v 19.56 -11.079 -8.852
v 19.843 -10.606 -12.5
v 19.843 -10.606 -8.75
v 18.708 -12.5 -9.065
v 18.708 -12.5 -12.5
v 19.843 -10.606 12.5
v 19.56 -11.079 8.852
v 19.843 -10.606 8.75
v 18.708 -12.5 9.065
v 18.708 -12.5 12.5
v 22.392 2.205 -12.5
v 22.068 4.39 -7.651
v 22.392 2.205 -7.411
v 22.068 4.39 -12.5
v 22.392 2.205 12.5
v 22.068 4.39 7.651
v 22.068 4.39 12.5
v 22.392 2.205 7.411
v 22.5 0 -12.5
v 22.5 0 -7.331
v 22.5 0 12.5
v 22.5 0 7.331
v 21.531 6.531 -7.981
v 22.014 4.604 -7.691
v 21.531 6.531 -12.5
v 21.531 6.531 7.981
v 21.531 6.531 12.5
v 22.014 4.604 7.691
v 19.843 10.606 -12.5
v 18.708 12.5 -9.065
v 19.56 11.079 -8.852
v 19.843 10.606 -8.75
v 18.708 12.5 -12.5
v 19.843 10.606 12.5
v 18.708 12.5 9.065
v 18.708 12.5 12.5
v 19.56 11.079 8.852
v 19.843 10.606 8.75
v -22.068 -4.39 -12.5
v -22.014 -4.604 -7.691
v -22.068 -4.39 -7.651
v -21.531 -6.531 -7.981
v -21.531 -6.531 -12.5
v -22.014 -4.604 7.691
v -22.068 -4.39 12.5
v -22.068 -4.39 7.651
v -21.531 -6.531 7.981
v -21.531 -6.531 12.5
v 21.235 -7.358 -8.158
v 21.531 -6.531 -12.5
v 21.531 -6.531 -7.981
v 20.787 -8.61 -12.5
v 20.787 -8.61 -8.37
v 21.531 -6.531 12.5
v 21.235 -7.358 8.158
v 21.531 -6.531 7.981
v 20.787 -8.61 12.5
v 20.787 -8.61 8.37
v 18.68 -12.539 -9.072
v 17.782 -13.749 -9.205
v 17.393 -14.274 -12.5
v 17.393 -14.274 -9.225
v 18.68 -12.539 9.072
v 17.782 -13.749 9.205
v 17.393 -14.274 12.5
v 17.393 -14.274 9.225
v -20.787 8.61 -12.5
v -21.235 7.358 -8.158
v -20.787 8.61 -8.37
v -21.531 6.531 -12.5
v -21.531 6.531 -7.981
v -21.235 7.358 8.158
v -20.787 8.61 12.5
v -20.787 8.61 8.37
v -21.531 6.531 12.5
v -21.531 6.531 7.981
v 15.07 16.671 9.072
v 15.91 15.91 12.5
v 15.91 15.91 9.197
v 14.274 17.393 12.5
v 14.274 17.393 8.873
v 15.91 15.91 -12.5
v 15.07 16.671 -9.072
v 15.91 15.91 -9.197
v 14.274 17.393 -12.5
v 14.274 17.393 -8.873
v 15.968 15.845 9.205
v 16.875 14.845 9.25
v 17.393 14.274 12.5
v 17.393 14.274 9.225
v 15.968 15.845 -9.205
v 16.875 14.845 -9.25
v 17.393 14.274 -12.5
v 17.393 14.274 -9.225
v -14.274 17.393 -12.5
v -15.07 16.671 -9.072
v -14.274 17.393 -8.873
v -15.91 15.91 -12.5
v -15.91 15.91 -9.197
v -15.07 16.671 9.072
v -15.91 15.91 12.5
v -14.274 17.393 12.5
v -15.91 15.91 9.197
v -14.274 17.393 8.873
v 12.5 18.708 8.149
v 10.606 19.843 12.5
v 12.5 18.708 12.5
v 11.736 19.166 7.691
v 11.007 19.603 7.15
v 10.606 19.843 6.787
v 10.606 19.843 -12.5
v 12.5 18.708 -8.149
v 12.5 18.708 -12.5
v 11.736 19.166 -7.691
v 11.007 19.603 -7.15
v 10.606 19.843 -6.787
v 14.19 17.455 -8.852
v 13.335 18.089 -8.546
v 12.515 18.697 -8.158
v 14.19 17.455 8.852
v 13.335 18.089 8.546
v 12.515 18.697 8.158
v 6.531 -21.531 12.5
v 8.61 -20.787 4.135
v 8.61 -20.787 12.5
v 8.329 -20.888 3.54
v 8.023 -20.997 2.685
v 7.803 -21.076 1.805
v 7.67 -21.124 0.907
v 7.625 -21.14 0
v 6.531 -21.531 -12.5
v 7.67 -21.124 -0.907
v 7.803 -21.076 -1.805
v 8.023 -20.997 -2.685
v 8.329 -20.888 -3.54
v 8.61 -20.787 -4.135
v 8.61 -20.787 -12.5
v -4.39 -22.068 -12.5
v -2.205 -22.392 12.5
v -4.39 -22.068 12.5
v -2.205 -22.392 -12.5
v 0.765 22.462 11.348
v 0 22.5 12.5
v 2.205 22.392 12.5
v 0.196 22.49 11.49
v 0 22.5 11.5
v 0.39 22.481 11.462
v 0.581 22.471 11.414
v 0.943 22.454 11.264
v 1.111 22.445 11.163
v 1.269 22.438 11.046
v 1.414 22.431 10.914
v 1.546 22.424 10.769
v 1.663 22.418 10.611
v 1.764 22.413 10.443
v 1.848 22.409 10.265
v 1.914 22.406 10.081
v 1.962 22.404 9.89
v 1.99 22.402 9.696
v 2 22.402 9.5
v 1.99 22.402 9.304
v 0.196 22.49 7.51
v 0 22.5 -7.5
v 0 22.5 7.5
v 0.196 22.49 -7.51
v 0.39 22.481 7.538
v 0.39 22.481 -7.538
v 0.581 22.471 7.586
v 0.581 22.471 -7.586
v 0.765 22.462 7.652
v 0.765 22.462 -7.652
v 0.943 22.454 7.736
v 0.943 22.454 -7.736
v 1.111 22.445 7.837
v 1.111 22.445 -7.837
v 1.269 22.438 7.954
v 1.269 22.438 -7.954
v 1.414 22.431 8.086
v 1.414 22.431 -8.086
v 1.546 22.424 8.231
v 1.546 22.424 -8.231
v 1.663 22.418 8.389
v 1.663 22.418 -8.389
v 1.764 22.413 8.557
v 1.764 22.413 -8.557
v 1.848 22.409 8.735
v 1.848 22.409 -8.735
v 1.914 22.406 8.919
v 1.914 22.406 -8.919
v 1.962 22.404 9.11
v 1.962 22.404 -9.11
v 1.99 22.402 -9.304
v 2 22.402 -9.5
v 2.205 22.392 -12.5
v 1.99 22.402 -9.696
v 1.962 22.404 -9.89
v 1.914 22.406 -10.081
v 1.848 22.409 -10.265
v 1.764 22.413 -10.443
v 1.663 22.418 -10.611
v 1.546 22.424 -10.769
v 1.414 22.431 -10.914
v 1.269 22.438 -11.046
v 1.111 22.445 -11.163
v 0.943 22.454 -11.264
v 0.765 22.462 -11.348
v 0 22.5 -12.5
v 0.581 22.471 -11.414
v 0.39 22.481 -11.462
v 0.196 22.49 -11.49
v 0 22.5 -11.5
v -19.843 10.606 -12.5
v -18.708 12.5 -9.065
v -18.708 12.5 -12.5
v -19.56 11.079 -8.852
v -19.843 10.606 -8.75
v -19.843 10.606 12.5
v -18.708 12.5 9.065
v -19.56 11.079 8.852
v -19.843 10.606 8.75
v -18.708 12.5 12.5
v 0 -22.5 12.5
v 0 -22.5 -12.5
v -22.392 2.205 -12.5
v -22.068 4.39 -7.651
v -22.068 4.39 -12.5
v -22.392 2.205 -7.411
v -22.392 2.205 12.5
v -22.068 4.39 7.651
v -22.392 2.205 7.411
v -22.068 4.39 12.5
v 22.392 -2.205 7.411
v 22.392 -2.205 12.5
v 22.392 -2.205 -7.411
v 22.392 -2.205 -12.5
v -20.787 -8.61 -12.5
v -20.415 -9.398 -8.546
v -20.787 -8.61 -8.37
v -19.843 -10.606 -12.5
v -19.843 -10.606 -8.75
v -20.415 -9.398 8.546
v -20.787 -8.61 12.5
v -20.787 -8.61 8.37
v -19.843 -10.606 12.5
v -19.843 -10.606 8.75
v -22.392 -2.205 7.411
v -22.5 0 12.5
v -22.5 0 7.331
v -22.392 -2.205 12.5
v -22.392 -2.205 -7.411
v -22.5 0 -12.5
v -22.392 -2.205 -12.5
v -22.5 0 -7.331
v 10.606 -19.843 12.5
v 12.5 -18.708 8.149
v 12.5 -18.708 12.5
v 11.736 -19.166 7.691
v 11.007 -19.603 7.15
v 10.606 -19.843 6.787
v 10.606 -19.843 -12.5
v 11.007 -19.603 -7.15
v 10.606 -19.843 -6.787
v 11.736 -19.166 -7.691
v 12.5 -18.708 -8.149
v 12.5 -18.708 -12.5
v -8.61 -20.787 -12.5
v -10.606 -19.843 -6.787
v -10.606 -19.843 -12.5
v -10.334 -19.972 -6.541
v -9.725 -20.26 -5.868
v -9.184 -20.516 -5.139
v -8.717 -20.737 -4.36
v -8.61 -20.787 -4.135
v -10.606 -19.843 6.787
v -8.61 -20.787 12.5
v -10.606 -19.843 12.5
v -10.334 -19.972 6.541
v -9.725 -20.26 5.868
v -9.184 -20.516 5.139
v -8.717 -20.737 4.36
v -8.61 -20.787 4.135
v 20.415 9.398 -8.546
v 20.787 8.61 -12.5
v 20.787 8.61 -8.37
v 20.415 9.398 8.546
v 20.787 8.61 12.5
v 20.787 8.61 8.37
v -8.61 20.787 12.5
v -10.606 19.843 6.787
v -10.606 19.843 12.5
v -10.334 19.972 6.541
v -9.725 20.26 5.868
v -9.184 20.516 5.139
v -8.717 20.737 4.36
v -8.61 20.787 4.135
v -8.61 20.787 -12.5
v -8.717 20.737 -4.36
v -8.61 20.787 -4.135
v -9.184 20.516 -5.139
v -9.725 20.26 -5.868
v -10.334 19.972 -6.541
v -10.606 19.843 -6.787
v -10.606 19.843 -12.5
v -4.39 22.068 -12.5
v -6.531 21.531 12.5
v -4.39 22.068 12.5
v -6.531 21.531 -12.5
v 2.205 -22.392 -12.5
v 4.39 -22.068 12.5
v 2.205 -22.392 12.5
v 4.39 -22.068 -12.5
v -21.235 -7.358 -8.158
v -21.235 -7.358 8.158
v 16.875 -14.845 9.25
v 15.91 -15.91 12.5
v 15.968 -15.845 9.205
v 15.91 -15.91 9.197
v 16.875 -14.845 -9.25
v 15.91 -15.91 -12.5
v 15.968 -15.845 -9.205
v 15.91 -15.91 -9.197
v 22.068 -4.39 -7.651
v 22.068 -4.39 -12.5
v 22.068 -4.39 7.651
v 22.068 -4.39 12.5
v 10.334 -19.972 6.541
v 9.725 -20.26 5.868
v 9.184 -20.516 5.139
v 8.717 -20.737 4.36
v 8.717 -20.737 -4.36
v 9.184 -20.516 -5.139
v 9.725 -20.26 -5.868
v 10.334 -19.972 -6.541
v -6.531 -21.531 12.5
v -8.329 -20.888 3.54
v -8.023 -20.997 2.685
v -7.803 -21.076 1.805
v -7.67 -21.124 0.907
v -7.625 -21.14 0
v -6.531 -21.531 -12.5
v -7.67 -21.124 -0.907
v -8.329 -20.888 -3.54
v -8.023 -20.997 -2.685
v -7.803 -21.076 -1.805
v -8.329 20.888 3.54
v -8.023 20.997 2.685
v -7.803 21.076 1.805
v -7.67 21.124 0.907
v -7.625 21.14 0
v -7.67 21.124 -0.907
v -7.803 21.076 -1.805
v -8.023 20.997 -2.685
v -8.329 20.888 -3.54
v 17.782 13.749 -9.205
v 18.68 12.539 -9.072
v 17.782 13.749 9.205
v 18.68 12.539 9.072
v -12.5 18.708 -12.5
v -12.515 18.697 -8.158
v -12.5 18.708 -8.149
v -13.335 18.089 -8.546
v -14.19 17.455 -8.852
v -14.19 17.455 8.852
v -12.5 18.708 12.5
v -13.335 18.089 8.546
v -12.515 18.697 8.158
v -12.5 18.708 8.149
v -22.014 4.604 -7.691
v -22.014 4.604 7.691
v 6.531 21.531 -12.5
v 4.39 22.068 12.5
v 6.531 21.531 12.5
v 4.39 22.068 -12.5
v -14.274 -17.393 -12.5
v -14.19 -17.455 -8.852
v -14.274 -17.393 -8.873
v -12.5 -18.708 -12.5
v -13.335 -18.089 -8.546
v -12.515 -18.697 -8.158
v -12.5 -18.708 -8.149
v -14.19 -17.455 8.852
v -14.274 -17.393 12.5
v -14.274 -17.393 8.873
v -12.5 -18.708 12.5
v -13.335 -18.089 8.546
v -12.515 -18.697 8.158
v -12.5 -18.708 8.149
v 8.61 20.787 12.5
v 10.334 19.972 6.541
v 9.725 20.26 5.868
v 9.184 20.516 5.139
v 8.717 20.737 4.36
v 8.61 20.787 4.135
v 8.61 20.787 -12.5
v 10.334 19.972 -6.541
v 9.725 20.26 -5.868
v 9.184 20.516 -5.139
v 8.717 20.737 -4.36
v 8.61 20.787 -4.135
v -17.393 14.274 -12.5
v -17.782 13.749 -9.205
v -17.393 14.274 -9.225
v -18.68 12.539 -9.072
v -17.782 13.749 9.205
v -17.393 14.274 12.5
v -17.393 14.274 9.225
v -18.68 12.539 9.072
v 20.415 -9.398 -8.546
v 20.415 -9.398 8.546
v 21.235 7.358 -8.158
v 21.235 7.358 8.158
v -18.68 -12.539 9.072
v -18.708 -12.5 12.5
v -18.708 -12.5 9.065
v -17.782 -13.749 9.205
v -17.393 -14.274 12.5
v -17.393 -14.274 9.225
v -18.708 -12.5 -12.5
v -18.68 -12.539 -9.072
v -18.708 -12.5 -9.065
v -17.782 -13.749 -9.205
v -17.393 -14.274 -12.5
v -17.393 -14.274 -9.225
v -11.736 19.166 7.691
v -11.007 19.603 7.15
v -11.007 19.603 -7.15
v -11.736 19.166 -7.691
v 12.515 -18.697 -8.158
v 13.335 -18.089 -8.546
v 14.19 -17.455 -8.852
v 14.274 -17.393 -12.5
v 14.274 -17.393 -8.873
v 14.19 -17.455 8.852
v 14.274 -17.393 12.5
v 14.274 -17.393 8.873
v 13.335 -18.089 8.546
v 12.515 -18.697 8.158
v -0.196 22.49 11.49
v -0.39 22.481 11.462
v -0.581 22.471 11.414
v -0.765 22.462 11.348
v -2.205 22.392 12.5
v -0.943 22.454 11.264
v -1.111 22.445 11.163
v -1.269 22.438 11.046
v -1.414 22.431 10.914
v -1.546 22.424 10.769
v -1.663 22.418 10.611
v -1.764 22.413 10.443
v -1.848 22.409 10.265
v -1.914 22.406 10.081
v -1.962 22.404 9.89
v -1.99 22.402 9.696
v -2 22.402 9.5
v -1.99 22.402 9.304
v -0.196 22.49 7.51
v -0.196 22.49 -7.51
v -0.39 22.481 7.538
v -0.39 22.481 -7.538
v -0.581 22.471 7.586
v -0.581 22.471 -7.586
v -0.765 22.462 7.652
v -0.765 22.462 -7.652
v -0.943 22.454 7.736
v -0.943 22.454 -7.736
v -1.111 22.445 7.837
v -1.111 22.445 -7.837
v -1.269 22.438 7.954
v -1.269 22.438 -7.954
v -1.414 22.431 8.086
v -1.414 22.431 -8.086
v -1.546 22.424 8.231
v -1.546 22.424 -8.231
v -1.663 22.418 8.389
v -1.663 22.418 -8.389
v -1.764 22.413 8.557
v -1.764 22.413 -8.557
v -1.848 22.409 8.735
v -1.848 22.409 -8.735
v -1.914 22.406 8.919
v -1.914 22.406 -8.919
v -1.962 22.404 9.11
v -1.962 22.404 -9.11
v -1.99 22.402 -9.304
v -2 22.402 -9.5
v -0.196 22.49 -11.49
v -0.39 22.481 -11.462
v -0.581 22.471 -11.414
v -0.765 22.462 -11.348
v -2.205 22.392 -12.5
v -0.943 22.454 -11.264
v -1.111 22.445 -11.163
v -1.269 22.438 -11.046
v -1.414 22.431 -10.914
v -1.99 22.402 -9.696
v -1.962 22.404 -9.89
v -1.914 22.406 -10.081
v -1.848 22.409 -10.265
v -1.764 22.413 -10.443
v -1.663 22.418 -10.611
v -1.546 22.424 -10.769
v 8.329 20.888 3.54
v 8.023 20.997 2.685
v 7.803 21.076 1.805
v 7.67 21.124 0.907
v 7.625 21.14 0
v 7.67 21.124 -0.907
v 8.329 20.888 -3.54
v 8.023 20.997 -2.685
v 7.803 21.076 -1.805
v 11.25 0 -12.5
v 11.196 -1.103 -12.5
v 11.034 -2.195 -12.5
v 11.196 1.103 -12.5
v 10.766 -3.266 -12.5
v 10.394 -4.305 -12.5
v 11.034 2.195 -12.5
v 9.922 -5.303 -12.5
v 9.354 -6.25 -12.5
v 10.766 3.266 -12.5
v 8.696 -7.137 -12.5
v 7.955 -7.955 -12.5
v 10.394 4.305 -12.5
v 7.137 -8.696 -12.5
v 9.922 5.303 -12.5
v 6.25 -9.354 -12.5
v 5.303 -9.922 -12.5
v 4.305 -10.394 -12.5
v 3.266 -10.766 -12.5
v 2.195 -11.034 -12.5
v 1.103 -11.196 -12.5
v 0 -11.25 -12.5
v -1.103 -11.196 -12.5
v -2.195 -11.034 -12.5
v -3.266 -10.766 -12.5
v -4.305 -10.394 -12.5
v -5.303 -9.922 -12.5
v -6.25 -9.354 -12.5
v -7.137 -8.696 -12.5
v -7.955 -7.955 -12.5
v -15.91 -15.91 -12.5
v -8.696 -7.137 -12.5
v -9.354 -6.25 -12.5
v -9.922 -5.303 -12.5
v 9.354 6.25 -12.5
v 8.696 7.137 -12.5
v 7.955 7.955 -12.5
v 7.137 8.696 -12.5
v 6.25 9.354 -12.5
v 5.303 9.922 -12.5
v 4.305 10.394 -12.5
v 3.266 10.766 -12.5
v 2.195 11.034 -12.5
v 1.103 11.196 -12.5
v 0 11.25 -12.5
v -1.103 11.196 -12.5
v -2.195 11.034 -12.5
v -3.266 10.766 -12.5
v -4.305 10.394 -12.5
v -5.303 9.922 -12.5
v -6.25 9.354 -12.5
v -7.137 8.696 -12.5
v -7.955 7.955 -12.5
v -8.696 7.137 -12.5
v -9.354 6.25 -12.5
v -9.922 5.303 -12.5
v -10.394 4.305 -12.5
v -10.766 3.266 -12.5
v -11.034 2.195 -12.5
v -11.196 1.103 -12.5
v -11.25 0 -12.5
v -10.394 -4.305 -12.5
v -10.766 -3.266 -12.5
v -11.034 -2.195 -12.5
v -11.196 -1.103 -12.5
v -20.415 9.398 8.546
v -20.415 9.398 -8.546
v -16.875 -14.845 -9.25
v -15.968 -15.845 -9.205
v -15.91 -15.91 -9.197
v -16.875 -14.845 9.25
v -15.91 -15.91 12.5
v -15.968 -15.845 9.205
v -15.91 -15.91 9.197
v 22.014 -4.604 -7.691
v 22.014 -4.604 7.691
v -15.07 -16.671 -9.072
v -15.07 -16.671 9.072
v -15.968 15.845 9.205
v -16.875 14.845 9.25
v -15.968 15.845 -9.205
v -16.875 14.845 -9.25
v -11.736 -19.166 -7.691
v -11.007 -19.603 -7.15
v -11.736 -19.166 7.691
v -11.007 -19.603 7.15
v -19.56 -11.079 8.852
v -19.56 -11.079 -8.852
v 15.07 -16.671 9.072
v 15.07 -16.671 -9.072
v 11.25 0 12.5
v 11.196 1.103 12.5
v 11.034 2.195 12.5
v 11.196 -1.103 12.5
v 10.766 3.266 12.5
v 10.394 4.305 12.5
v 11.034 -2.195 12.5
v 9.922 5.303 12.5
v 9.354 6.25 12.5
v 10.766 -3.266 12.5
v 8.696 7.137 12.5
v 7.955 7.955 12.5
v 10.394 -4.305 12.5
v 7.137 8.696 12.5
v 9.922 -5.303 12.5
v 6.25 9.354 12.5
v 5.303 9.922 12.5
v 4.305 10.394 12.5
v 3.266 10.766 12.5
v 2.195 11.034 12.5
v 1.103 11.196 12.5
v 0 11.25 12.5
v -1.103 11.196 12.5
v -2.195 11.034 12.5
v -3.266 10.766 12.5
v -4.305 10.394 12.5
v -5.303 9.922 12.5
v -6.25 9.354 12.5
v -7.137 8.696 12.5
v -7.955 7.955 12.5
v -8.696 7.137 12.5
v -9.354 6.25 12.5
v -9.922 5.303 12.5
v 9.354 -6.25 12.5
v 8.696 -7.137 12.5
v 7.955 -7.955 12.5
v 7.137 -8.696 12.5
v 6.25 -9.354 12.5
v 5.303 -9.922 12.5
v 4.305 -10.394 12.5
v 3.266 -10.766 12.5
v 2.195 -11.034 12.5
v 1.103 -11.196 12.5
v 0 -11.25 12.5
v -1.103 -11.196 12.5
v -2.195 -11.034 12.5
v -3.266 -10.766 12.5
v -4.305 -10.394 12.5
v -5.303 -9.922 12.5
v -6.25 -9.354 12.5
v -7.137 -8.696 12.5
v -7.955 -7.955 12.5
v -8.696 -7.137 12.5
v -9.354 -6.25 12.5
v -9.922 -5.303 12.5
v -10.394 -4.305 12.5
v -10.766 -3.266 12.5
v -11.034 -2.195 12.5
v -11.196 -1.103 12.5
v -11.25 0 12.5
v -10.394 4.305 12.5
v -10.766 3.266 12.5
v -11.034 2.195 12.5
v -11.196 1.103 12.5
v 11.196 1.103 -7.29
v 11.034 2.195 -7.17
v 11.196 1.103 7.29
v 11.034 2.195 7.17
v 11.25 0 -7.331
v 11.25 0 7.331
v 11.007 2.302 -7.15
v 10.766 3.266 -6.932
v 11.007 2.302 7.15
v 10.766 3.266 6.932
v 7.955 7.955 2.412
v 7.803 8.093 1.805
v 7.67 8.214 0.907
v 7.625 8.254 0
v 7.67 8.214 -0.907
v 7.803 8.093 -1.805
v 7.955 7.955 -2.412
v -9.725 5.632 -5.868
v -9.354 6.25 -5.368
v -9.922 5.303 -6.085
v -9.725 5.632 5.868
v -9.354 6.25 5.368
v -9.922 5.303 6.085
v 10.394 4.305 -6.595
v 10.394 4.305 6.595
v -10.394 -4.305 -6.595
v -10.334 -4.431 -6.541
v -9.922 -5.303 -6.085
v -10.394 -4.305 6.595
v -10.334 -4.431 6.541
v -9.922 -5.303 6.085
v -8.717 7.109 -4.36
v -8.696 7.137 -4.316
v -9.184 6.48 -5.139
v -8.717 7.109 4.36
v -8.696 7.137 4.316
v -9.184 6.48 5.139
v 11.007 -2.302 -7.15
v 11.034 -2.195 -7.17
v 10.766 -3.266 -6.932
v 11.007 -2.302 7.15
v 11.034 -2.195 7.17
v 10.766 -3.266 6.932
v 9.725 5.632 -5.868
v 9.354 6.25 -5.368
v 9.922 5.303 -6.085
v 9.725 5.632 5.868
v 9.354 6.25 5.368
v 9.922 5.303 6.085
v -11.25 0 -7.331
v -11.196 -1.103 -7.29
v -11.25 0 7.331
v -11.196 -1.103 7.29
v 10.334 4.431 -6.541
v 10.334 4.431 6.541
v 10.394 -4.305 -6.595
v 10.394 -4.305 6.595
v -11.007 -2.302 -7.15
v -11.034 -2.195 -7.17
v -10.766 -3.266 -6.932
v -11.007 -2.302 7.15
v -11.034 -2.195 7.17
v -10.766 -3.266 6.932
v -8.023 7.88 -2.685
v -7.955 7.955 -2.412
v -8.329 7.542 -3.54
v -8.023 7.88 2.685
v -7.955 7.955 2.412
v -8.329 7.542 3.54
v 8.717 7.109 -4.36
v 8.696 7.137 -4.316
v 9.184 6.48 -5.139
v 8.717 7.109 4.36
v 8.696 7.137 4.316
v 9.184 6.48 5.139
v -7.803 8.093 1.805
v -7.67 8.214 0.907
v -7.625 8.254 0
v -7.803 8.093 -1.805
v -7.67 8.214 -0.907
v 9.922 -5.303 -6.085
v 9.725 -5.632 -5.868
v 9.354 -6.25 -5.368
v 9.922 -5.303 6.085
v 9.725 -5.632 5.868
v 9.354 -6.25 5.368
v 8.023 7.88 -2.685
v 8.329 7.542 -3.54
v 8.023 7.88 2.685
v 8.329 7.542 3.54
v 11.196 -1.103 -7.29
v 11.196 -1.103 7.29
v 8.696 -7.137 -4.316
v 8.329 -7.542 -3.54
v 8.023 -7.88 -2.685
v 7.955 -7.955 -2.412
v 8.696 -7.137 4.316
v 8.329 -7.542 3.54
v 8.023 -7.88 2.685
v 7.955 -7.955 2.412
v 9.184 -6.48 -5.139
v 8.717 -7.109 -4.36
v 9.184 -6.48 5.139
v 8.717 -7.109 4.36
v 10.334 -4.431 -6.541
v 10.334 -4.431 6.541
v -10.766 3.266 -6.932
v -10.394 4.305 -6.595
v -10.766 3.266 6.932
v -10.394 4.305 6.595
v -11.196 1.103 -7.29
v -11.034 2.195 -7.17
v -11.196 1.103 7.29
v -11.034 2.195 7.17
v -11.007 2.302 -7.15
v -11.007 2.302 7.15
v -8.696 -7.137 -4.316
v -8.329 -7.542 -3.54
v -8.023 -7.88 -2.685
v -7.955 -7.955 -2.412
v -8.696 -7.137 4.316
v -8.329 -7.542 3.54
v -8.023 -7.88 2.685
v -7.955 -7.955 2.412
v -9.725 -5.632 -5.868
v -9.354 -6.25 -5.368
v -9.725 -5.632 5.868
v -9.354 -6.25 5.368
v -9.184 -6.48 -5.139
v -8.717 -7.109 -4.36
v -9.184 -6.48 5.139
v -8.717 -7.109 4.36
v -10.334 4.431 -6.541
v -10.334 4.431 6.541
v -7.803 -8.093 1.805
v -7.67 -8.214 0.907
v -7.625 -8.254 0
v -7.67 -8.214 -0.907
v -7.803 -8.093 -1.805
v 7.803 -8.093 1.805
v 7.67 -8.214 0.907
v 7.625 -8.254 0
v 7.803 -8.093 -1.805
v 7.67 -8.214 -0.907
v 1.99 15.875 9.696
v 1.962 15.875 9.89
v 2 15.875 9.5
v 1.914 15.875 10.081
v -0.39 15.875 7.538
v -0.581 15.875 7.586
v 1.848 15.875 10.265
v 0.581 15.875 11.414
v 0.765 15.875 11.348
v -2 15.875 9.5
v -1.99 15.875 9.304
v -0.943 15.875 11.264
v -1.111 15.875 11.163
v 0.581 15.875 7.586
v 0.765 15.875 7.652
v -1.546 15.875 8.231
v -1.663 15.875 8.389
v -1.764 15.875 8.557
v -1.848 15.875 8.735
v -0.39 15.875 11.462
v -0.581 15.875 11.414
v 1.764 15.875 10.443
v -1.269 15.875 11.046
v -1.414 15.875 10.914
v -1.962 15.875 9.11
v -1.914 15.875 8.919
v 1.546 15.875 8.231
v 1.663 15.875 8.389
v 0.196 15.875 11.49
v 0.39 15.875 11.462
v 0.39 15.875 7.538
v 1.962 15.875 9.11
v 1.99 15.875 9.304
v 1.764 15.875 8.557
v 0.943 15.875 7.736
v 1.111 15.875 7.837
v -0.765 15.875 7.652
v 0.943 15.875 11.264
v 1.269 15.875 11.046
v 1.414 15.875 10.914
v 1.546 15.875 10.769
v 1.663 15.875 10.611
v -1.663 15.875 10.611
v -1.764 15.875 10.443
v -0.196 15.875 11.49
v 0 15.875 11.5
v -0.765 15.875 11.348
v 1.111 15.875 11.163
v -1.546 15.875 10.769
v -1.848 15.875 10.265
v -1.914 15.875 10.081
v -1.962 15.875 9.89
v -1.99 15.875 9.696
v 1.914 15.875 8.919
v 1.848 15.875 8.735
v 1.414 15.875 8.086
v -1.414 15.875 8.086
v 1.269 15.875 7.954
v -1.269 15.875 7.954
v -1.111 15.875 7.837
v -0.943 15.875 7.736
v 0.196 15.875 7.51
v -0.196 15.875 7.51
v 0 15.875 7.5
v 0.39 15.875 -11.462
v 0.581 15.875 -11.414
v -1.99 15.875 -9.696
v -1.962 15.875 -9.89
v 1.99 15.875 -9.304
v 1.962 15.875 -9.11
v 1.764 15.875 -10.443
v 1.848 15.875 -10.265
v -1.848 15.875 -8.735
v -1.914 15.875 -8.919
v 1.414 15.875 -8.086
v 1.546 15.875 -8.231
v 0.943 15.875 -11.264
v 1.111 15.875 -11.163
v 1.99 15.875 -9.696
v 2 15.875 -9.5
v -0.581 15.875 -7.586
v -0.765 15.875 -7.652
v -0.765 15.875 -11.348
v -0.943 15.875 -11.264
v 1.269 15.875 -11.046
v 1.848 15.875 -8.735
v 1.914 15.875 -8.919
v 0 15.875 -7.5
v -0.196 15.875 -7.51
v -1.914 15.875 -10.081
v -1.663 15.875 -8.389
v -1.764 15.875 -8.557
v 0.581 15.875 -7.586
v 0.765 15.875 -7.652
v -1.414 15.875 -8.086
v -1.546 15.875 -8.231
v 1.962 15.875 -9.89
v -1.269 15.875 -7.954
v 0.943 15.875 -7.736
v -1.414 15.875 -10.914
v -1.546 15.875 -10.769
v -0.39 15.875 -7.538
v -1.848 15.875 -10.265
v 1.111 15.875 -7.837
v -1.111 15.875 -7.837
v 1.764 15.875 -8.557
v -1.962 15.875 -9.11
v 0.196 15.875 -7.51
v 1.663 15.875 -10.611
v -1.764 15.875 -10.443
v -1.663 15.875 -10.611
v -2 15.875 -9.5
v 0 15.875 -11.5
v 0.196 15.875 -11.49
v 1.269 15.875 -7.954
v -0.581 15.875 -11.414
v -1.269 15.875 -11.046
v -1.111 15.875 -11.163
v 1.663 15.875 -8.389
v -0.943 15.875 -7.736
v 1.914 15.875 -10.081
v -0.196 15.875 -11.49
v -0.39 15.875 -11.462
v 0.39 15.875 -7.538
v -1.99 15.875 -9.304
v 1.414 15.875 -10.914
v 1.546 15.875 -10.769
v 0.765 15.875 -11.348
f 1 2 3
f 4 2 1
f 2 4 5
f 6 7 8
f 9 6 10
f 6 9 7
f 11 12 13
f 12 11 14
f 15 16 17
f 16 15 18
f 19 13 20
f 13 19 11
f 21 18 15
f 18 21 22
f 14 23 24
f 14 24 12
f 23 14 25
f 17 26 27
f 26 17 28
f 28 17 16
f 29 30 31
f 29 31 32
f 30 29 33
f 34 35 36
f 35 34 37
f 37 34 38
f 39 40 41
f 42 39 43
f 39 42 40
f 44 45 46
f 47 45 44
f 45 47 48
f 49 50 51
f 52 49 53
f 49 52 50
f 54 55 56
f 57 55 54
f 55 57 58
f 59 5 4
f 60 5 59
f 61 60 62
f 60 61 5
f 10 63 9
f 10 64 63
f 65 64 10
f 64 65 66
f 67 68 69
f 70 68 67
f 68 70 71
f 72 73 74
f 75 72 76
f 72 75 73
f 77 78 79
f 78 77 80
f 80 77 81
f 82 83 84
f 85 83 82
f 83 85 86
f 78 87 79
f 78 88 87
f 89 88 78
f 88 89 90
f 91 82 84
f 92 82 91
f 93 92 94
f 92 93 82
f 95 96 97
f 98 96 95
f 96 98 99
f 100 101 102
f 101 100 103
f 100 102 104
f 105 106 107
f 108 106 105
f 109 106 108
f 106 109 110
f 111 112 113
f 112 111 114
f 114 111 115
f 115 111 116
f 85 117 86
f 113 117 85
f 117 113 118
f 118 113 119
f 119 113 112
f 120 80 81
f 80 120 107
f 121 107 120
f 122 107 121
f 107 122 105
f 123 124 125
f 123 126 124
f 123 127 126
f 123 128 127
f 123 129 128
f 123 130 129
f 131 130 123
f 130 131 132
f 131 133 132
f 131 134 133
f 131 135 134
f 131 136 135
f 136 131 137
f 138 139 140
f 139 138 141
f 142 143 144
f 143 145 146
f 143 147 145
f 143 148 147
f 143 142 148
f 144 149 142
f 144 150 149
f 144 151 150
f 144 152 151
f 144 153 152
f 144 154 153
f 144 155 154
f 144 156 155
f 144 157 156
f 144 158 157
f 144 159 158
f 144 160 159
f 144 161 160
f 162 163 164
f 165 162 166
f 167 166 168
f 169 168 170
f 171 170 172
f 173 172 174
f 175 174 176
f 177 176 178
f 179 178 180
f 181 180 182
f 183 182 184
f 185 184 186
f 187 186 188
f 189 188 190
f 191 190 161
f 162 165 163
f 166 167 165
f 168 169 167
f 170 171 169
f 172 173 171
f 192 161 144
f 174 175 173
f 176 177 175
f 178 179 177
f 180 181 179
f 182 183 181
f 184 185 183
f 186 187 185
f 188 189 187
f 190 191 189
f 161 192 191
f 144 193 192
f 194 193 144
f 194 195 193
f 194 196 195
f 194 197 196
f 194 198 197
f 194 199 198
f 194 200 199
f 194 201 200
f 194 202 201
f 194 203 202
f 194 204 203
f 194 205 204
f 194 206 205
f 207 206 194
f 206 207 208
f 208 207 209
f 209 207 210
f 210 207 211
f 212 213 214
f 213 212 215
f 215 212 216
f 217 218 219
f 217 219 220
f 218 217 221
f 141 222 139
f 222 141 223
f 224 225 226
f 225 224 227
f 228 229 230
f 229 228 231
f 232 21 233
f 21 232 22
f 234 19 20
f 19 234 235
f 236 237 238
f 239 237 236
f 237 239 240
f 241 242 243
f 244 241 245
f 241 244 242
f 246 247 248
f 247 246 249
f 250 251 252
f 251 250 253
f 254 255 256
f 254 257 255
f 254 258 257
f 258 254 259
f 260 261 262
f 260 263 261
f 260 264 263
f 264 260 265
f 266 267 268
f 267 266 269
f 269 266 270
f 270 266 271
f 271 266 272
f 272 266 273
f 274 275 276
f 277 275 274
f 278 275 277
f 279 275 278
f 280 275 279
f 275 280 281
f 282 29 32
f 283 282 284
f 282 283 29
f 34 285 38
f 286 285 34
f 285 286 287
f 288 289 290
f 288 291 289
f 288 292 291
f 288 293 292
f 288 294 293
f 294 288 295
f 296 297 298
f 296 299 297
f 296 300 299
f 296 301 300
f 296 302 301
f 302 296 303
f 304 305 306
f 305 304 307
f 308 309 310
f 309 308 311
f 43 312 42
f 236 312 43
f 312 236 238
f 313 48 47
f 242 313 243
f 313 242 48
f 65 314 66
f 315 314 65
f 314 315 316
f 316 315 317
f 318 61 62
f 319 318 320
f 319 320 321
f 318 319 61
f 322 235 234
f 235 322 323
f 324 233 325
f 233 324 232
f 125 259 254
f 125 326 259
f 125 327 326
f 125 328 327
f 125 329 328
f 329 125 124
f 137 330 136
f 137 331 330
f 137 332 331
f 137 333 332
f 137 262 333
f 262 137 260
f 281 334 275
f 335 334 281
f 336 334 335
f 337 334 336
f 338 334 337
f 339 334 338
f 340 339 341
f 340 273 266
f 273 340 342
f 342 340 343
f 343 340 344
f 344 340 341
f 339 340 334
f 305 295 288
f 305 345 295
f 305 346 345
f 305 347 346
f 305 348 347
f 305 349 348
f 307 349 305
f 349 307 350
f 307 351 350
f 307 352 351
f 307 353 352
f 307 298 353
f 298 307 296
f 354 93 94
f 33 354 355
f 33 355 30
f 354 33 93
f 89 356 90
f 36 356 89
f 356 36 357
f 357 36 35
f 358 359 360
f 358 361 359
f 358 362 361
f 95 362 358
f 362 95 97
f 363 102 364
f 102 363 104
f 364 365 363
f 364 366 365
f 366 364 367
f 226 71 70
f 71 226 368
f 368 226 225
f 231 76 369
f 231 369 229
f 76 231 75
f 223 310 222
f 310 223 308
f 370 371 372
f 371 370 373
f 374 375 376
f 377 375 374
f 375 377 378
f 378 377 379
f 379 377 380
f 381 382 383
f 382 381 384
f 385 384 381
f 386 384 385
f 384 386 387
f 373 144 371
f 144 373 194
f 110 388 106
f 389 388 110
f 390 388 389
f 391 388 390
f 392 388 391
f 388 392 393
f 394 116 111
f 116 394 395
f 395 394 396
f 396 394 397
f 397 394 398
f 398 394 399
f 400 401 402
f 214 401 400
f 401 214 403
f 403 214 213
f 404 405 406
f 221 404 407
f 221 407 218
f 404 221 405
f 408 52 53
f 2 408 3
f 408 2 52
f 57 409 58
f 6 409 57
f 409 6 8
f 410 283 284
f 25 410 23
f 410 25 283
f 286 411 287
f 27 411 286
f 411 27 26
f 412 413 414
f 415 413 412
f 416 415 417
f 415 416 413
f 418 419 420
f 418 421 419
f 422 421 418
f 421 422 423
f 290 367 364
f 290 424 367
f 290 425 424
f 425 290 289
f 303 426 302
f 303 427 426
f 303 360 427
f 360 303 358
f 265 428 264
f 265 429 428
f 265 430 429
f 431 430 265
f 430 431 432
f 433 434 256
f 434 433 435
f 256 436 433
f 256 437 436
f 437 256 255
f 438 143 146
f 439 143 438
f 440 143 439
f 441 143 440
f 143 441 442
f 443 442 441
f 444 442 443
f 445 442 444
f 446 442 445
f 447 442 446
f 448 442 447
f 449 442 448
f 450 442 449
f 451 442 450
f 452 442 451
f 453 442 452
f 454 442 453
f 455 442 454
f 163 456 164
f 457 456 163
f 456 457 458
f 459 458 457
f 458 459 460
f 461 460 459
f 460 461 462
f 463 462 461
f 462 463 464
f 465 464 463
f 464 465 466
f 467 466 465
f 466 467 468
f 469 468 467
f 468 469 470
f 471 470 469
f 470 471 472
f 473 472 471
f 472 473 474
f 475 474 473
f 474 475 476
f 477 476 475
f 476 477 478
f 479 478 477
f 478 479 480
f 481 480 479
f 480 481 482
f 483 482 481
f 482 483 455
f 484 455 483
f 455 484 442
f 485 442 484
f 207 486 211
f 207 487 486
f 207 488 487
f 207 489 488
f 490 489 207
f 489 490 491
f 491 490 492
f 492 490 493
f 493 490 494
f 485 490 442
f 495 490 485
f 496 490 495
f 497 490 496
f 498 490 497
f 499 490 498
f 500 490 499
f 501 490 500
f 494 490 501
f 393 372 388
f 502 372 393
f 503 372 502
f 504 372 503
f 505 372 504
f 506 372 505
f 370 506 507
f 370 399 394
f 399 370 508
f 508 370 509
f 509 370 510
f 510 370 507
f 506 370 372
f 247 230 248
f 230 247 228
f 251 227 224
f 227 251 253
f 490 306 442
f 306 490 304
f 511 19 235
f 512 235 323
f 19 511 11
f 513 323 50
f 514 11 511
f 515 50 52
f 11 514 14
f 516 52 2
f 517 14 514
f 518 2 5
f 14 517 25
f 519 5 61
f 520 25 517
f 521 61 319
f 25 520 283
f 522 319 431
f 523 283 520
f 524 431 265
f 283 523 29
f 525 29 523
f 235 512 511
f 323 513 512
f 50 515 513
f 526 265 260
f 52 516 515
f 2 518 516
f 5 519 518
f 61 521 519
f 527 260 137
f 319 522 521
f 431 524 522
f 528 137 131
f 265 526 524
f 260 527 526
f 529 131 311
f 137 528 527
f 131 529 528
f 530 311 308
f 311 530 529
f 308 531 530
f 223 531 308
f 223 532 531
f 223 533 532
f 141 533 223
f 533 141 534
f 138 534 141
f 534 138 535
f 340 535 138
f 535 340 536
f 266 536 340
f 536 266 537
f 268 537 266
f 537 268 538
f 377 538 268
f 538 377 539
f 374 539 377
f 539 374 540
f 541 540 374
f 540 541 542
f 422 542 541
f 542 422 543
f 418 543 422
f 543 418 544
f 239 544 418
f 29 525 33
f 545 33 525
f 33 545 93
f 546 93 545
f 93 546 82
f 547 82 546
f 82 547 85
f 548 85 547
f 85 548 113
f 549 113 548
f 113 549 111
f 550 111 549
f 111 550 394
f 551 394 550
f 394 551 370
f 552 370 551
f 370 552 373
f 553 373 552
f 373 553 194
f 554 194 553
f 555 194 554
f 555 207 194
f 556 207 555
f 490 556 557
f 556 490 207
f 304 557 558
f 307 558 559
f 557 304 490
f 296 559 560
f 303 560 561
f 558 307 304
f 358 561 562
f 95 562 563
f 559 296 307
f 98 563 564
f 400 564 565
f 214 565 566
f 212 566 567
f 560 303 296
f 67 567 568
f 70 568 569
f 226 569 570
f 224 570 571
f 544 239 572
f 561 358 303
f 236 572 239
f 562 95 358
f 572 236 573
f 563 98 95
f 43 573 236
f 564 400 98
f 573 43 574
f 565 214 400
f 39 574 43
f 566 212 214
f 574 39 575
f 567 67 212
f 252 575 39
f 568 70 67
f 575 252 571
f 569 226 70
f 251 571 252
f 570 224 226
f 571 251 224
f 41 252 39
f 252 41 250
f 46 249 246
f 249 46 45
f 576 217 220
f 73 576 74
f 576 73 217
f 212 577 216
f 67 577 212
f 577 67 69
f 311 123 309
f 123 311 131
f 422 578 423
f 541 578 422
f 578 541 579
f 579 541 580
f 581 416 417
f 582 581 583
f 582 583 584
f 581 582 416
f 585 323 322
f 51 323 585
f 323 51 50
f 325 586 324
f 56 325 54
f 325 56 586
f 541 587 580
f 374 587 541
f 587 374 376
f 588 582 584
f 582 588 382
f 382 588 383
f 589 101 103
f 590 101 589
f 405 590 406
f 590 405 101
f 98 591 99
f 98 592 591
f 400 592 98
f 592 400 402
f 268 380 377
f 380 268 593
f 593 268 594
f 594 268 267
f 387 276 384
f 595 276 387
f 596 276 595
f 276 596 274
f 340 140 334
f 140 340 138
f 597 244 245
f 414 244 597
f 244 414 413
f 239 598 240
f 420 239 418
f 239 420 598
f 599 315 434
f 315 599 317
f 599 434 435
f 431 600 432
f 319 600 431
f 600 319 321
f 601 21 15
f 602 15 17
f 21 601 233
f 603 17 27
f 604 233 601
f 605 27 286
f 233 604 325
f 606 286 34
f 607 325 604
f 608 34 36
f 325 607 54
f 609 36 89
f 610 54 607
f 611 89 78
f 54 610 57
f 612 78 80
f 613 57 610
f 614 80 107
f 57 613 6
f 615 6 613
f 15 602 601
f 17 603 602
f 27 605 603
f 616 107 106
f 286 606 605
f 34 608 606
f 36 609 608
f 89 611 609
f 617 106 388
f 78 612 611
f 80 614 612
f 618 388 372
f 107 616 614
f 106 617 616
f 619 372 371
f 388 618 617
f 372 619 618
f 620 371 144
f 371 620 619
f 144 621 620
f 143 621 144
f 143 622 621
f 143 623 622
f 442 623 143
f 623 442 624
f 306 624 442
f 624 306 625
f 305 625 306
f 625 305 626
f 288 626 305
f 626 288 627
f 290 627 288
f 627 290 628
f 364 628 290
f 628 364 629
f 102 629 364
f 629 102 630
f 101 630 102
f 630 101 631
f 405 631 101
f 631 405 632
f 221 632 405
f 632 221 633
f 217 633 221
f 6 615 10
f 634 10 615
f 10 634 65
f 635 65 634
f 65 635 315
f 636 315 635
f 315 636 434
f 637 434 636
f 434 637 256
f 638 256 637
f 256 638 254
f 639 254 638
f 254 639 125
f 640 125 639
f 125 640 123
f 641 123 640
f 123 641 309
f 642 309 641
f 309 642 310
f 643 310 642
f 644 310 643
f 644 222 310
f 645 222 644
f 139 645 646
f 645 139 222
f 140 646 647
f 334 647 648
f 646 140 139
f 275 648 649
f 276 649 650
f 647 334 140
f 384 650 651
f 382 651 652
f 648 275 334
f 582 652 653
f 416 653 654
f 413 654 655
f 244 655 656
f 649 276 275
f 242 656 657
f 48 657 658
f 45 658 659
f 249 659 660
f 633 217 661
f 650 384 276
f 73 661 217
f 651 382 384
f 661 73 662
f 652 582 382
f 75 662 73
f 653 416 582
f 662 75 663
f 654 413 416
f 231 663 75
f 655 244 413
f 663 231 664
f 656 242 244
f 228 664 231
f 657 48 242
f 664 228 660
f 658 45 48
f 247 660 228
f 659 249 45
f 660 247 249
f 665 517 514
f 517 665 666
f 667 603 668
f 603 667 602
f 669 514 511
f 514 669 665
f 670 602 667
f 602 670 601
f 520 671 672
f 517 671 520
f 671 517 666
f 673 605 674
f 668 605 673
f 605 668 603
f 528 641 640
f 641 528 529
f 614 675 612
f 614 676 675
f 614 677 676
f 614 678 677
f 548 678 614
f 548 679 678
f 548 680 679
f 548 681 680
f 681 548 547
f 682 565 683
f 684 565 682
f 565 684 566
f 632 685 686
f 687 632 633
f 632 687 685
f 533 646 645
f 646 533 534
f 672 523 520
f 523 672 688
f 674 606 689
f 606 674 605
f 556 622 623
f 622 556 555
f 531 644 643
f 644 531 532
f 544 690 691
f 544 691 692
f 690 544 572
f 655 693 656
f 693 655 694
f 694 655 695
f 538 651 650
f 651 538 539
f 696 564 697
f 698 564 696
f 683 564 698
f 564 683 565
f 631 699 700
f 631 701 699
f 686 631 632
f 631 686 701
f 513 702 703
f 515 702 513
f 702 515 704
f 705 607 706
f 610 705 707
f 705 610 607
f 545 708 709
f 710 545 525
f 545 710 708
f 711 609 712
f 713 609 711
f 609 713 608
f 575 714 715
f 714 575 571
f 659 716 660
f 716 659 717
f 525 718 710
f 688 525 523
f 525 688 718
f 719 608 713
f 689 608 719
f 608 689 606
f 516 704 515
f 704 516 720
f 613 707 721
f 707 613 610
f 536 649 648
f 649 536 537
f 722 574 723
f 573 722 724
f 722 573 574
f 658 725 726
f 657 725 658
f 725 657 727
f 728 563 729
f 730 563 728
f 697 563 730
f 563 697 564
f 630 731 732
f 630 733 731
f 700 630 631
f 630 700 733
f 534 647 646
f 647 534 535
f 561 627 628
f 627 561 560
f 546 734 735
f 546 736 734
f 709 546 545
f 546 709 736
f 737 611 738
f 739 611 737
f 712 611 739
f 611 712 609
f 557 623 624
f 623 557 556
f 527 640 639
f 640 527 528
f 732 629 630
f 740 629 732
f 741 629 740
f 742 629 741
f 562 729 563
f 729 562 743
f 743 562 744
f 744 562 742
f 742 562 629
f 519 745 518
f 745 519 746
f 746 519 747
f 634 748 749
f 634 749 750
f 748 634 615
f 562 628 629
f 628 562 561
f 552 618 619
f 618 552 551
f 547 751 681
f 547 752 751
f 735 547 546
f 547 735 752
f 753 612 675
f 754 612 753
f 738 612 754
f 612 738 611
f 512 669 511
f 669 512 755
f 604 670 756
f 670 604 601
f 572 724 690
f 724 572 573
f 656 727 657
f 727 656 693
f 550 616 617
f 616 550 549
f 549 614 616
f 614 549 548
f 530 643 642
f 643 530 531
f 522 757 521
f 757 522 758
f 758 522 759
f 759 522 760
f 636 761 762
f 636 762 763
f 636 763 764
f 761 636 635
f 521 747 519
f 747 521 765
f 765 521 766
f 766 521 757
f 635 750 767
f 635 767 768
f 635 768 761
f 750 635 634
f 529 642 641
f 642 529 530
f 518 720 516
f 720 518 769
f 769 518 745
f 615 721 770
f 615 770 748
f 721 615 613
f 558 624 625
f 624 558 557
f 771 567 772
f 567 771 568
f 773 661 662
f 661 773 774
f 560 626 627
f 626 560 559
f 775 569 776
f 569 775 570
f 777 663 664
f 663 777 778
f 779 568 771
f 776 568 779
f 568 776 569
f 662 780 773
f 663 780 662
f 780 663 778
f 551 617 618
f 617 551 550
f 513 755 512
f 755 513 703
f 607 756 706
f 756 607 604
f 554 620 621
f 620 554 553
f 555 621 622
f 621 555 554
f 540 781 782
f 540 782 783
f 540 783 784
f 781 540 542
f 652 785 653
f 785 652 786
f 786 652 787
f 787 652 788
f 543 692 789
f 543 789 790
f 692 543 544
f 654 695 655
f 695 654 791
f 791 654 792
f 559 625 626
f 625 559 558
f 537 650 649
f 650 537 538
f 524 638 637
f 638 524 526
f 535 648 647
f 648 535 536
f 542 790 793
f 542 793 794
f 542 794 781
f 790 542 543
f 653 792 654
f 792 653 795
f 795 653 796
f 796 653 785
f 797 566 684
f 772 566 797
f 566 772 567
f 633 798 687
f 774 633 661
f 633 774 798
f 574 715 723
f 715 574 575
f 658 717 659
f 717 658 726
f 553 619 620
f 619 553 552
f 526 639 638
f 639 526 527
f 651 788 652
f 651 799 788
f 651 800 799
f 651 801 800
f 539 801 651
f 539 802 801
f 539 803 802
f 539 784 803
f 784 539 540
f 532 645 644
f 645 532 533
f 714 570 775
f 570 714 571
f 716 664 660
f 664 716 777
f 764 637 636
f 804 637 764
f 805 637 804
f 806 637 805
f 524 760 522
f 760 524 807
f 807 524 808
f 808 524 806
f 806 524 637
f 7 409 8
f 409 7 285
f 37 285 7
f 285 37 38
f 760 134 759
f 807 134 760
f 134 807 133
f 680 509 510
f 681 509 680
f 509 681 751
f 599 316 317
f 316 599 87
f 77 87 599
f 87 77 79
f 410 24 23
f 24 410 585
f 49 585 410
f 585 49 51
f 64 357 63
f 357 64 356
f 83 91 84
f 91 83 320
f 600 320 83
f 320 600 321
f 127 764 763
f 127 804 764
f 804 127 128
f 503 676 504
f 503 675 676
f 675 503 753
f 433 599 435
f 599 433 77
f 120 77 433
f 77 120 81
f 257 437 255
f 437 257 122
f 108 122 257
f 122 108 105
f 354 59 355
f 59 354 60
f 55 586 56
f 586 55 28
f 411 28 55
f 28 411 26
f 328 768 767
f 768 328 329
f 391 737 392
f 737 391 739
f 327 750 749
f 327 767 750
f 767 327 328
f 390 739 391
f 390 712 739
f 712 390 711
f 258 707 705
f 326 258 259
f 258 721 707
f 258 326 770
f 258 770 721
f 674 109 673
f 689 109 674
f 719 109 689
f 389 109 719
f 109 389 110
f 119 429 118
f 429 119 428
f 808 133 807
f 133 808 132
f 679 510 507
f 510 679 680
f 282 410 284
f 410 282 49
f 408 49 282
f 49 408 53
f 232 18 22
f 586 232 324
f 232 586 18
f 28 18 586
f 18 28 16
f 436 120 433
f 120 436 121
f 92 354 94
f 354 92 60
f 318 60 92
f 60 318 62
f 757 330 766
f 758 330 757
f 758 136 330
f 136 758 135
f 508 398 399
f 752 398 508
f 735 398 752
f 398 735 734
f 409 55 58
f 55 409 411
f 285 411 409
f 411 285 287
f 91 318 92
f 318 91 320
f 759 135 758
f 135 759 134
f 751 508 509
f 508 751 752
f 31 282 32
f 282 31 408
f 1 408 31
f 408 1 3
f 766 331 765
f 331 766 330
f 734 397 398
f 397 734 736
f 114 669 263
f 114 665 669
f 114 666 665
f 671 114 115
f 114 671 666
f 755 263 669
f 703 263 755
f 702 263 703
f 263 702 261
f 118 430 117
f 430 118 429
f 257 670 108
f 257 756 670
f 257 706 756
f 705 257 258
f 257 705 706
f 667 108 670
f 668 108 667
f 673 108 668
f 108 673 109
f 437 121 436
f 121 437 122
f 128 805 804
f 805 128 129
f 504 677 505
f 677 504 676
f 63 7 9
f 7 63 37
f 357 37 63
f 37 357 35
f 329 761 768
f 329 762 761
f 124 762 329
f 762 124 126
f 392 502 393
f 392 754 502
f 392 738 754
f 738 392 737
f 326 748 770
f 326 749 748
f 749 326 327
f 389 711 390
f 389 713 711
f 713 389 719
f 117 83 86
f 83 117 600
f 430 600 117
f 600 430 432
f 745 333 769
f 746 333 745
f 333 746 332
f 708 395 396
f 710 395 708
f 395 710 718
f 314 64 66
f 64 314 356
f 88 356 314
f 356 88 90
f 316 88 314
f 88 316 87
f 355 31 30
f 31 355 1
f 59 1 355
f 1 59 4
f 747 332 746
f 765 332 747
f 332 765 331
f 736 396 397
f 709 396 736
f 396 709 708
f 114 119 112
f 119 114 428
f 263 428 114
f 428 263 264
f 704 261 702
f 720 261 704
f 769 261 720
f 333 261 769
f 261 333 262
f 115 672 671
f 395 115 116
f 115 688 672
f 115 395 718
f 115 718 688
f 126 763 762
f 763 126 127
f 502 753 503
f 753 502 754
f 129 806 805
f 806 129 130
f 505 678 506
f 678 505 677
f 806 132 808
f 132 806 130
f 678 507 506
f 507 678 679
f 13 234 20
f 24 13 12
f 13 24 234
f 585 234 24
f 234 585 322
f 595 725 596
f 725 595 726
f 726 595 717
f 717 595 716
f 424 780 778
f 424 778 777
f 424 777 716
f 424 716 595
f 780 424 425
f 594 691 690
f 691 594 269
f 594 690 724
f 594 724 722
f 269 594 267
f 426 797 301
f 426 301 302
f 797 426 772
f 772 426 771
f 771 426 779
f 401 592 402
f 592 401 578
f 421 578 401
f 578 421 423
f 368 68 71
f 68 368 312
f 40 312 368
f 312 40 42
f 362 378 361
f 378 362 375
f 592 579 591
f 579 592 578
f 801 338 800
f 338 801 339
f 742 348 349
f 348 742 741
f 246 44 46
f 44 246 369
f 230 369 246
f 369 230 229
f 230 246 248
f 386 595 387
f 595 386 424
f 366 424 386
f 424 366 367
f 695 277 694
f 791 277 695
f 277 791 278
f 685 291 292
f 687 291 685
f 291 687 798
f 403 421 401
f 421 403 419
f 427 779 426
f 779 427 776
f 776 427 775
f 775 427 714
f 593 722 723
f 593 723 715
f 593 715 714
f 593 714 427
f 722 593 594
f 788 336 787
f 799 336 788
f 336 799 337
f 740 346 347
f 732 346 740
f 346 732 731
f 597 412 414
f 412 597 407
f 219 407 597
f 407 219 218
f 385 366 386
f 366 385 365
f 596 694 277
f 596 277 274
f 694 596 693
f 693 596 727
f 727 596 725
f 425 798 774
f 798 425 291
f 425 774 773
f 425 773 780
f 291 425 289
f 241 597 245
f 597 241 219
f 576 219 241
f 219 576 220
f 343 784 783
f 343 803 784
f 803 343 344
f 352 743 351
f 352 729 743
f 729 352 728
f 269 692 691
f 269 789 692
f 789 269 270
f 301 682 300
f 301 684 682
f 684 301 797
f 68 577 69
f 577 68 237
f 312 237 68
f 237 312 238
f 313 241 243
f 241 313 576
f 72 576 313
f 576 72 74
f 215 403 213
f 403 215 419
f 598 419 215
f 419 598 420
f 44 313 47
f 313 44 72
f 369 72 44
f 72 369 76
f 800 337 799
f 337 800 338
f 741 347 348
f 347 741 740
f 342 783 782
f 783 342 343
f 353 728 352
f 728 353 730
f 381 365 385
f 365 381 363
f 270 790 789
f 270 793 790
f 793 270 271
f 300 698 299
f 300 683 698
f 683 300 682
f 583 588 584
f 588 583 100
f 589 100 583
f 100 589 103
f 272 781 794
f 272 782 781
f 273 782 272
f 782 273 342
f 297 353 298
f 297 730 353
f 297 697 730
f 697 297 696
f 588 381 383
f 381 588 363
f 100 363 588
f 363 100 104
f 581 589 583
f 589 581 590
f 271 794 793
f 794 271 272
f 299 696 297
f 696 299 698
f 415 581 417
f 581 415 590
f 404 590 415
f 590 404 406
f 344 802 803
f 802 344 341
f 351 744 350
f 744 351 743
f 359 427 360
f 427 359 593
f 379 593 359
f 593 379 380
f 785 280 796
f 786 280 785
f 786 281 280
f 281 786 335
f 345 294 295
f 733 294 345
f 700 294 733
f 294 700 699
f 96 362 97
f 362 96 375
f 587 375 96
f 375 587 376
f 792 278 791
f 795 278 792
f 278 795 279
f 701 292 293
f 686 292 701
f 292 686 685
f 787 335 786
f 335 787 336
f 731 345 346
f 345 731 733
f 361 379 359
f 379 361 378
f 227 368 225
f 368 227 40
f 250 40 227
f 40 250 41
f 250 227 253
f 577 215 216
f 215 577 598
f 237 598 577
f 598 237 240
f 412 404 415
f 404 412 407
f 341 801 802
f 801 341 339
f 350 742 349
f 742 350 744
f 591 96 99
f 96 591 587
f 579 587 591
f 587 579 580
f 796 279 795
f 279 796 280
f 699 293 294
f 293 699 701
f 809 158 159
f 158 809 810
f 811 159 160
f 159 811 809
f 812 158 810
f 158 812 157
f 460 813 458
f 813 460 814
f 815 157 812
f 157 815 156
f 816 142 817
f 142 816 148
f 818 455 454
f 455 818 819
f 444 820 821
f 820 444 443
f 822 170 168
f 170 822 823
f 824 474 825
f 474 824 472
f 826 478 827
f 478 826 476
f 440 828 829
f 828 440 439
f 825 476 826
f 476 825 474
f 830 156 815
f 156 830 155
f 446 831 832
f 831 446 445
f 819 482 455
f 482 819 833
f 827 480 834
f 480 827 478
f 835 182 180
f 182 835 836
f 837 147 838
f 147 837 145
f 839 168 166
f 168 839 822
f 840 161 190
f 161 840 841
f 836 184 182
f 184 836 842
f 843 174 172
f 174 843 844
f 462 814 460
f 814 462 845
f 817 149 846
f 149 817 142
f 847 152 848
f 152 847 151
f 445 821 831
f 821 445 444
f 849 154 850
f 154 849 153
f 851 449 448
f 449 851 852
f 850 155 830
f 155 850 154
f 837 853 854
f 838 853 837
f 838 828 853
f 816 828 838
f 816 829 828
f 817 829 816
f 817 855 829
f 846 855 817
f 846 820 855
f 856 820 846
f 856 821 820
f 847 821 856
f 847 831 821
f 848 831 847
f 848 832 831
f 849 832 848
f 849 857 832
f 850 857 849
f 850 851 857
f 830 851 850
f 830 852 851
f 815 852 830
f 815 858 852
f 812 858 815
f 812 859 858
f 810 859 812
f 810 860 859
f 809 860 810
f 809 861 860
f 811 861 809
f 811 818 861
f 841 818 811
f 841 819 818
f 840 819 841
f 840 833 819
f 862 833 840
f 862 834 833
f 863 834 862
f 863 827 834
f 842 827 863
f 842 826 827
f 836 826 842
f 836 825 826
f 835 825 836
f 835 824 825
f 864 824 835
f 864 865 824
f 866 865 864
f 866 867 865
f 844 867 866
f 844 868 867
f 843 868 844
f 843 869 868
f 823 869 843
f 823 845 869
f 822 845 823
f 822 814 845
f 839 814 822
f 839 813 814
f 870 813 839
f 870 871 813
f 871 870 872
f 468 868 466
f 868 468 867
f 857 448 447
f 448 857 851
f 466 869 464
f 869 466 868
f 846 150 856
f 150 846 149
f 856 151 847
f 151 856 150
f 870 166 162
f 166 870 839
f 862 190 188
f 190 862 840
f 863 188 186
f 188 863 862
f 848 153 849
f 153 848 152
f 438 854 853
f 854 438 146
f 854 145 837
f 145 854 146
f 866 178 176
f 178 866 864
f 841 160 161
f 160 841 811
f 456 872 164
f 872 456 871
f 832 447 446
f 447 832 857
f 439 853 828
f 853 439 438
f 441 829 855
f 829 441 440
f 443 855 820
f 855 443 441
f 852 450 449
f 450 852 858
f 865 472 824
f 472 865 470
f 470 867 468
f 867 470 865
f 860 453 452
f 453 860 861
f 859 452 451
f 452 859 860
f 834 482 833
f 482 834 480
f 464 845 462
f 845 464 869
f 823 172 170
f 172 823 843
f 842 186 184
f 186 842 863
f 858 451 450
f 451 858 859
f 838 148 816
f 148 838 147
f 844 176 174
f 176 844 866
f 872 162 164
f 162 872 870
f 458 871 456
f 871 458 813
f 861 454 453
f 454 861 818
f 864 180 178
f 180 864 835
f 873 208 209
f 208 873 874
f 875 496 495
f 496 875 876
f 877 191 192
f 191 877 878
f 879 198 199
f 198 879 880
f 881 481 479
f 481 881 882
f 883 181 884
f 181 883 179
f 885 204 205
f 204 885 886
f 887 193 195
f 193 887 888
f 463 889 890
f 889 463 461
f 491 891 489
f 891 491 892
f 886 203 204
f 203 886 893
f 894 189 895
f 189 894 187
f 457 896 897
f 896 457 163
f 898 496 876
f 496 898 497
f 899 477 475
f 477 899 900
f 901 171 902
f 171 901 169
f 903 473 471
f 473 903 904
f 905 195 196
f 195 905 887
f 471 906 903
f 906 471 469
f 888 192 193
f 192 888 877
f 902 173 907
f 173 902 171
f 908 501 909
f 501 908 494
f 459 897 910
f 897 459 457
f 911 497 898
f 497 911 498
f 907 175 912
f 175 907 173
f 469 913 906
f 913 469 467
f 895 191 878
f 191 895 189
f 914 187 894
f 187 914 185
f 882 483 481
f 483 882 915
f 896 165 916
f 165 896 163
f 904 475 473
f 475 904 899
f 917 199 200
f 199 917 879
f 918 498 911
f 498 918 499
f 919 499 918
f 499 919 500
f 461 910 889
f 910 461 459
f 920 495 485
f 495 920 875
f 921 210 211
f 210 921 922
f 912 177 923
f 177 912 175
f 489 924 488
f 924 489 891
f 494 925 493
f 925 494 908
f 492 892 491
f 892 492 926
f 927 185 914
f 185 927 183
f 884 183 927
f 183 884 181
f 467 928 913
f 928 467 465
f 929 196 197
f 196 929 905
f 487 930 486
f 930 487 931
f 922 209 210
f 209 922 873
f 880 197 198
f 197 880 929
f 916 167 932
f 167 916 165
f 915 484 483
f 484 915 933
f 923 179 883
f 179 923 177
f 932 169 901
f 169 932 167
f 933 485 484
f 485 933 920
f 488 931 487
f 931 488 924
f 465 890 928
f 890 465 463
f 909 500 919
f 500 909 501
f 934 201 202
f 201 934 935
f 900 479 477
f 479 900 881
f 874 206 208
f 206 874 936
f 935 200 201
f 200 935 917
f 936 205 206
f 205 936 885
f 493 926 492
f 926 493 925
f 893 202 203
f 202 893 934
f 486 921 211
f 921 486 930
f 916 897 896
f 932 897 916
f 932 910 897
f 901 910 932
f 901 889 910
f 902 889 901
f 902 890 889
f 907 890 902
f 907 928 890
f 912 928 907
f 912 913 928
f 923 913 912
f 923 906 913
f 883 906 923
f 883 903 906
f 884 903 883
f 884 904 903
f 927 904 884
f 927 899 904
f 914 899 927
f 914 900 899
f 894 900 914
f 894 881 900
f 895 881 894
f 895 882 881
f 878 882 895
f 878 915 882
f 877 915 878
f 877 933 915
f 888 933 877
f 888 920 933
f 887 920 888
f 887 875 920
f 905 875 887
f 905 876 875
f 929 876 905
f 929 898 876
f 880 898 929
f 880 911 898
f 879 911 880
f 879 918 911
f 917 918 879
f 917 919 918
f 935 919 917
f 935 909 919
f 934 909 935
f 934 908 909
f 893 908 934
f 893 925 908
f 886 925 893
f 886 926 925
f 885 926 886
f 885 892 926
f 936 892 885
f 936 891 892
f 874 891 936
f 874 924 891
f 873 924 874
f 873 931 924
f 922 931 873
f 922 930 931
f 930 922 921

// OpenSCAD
// COBRA Vertebra - L1 V19
// Height: 25.0mm, OD: 45.0mm

$fn = 64;

difference() {
    // Outer cylinder
    cylinder(h=25.0, d=45.0, center=true);
    
    // Inner channel
    cylinder(h=27.0, d=22.5, center=true);

    // Battery cavity 1
    rotate([0, 0, 0])
    translate([16.875, 0, 0])
    rotate([90, 0, 0])
    cylinder(h=74.0, d=18.5, center=true);

    // Battery cavity 2
    rotate([0, 0, 180])
    translate([16.875, 0, 0])
    rotate([90, 0, 0])
    cylinder(h=74.0, d=18.5, center=true);

    // Pivot holes
    translate([0, 22.5, 9.5])
    rotate([90, 0, 0])
    cylinder(h=13.25, d=4, center=true);
    
    translate([0, 22.5, -9.5])
    rotate([90, 0, 0])
    cylinder(h=13.25, d=4, center=true);
}
